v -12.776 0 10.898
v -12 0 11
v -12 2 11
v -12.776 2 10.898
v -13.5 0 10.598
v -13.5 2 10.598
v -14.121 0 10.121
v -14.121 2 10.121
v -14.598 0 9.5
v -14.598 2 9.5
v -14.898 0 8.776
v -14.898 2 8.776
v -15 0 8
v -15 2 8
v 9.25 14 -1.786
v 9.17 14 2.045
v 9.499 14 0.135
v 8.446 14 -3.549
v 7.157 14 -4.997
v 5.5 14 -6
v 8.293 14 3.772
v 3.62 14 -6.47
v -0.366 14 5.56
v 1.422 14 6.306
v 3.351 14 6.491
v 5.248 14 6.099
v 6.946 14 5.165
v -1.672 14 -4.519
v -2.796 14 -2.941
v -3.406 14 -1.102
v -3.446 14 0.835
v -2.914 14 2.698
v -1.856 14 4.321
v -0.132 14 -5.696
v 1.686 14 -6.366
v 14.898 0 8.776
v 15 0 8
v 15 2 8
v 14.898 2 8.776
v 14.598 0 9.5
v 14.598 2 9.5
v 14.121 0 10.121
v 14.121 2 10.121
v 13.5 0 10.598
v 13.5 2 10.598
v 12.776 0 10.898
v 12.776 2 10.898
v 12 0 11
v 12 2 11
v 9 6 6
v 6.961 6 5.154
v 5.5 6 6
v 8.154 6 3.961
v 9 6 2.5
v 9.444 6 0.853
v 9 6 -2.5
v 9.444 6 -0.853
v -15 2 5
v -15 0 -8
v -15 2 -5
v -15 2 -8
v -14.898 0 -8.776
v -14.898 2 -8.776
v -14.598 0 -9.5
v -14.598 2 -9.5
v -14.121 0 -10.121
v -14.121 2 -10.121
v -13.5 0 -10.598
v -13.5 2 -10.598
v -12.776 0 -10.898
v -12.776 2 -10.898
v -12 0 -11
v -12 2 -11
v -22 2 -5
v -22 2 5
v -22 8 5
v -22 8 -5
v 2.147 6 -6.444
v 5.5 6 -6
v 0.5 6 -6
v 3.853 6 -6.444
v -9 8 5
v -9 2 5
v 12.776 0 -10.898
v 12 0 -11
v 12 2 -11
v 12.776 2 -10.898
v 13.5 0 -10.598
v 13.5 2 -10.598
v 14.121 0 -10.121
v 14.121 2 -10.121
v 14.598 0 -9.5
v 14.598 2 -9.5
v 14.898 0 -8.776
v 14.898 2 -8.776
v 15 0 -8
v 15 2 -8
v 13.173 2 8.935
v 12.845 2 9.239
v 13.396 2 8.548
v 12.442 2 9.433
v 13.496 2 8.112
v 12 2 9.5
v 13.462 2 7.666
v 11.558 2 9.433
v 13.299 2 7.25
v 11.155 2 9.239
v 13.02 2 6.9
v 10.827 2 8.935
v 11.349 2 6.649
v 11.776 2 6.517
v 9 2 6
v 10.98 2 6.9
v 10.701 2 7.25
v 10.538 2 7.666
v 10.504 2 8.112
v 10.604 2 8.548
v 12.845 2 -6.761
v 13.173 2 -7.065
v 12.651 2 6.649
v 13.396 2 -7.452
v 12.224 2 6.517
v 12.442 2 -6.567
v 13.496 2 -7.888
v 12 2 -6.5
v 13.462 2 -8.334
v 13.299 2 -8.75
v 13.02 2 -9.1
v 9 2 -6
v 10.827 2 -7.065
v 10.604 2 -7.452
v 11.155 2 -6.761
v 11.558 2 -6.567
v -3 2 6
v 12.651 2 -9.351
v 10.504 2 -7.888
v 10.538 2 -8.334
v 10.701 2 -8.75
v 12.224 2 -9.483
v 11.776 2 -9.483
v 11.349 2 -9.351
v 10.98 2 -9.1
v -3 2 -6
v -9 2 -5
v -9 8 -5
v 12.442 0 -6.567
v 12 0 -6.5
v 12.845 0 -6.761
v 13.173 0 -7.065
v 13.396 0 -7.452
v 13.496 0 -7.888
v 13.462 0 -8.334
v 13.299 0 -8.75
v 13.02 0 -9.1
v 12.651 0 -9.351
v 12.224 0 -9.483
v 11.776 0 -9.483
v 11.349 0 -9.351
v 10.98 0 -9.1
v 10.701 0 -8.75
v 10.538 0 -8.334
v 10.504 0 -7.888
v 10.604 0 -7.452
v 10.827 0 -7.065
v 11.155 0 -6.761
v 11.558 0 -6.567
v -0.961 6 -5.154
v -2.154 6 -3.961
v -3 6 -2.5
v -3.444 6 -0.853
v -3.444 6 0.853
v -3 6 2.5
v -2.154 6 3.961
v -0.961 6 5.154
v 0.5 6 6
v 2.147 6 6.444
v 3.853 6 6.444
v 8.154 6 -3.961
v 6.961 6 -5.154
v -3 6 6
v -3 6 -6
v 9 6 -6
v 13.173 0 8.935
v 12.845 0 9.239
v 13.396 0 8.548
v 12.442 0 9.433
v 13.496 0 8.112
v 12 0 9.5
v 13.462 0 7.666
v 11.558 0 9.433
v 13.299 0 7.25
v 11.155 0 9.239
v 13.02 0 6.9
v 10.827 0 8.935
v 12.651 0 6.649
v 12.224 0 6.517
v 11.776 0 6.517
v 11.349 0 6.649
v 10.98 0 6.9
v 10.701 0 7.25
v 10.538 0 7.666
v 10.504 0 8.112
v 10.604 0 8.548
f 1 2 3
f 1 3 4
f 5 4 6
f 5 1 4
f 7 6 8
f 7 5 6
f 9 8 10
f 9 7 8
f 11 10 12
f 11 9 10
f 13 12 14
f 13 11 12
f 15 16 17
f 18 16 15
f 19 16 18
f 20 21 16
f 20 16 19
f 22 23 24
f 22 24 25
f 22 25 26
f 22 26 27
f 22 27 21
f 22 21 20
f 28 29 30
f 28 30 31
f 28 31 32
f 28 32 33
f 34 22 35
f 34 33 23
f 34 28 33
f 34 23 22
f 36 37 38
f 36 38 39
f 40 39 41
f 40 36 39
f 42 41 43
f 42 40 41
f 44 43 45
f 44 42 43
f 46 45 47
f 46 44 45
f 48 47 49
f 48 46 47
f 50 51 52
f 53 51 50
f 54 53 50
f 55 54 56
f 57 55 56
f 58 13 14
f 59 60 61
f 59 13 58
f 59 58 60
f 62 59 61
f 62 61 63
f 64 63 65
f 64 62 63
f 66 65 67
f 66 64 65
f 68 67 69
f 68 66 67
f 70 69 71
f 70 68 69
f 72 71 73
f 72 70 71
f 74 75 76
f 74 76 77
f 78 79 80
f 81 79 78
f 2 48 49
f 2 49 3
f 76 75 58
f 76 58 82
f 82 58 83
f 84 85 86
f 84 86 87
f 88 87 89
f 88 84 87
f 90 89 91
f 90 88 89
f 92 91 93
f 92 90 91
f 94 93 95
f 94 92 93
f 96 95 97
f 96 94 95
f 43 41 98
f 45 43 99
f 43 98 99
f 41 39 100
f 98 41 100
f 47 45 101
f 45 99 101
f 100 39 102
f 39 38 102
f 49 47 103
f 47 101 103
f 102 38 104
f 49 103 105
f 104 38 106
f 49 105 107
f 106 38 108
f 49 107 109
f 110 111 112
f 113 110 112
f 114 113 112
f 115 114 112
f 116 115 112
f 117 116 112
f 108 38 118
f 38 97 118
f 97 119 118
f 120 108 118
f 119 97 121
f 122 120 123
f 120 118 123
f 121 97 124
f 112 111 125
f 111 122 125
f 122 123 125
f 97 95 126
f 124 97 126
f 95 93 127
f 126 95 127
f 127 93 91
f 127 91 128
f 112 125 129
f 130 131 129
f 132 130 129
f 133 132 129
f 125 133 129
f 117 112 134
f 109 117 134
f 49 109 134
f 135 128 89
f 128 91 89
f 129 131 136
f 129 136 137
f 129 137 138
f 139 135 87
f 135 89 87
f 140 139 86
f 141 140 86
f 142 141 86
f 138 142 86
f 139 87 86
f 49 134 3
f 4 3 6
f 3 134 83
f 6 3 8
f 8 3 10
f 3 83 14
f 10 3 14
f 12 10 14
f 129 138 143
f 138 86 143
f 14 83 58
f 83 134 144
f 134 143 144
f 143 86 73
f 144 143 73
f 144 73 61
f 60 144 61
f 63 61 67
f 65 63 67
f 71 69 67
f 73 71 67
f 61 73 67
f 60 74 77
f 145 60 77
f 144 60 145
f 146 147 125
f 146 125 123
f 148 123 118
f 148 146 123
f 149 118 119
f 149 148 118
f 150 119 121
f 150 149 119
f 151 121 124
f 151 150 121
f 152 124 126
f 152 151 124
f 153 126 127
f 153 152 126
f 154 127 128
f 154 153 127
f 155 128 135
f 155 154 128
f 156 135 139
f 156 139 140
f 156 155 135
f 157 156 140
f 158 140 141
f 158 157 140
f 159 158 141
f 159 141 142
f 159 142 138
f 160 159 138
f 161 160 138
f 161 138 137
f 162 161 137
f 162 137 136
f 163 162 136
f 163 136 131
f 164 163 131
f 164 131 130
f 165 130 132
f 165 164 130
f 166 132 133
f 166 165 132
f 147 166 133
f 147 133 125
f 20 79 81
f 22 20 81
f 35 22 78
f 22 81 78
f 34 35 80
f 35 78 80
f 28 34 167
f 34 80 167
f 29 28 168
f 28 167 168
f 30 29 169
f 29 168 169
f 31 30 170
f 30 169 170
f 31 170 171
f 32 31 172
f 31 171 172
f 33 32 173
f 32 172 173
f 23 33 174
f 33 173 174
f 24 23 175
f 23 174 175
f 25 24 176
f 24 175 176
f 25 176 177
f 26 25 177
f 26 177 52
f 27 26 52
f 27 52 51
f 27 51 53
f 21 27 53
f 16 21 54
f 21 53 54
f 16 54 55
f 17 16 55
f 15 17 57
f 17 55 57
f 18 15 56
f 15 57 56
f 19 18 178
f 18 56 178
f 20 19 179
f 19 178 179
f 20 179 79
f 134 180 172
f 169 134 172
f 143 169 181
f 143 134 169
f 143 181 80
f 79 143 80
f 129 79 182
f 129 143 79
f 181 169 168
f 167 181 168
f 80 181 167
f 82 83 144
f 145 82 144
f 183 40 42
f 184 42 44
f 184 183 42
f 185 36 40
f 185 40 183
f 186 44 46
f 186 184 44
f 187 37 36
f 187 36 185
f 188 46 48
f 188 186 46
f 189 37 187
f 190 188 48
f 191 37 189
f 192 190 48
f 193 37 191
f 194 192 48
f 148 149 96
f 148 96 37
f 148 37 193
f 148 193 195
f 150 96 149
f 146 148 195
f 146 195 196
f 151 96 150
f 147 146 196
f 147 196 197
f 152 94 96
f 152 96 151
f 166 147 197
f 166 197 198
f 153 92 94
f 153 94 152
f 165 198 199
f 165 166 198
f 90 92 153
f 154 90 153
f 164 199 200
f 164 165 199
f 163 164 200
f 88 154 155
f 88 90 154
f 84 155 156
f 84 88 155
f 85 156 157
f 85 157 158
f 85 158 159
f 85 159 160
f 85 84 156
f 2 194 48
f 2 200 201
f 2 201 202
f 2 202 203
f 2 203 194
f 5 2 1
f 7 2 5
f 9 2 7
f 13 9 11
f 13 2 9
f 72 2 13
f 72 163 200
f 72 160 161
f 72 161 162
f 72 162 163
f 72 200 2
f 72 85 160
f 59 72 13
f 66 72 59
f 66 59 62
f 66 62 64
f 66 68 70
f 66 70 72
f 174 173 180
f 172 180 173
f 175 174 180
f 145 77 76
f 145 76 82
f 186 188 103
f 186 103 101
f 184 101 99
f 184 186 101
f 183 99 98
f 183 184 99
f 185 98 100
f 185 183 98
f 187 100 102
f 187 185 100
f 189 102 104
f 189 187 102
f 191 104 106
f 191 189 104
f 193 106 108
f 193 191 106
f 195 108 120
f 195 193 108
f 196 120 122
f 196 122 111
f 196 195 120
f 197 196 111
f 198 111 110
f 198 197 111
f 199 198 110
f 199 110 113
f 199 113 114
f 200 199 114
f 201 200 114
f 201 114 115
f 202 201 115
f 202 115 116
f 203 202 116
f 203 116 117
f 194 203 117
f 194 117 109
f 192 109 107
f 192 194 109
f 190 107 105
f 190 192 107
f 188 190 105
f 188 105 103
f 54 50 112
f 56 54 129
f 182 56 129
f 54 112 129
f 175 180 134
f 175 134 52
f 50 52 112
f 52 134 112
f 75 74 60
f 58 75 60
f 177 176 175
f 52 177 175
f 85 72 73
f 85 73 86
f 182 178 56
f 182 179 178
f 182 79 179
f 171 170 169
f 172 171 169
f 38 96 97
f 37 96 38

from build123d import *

# Parameters (mm, degrees)
SKETCH1_R           = 1.5
BOSS_EXTRUDE1_DEPTH = 2
SKETCH2_W           = 13
SKETCH2_H           = 10
BOSS_EXTRUDE2_DEPTH = 6
SKETCH4_W           = 12
SKETCH4_H           = 12
BOSS_EXTRUDE4_DEPTH = 4
SKETCH5_R           = 6.5
BOSS_EXTRUDE5_DEPTH = 8


with BuildPart() as part:
    # Sketch1 → Boss-Extrude1 (new body)
    with BuildSketch(Plane(origin=(0, 0, 0), x_dir=(1, 0, 0), z_dir=(0, 1, 0))):
        with BuildLine():
            Line((-12, 11), (12, 11))
            ThreePointArc((12, 11), (14.121320344, 10.121320344), (15, 8))
            Line((15, 8), (15, -8))
            ThreePointArc((15, -8), (14.121320344, -10.121320344), (12, -11))
            Line((12, -11), (-12, -11))
            ThreePointArc((-12, -11), (-14.121320344, -10.121320344), (-15, -8))
            Line((-15, -8), (-15, 8))
            ThreePointArc((-15, 8), (-14.121320344, 10.121320344), (-12, 11))
        make_face()
        with Locations(Location((12, 8, 0), (0, 0, 270))):
            Circle(SKETCH1_R, mode=Mode.SUBTRACT)
        with Locations(Location((12, -8, 0), (0, 0, 270))):
            Circle(SKETCH1_R, mode=Mode.SUBTRACT)
    extrude(amount=BOSS_EXTRUDE1_DEPTH)

    # Sketch2 → Boss-Extrude2 (add)
    with BuildSketch(Plane(origin=(0, 2, 0), x_dir=(1, 0, 0), z_dir=(0, 1, 0))):
        with Locations((-15.5, 0)):
            Rectangle(SKETCH2_W, SKETCH2_H)
    extrude(amount=BOSS_EXTRUDE2_DEPTH)

    # Sketch4 → Boss-Extrude4 (add)
    with BuildSketch(Plane(origin=(0, 2, 0), x_dir=(1, 0, 0), z_dir=(0, 1, 0))):
        with Locations((3, 0)):
            Rectangle(SKETCH4_W, SKETCH4_H)
    extrude(amount=BOSS_EXTRUDE4_DEPTH)

    # Sketch5 → Boss-Extrude5 (add)
    with BuildSketch(Plane(origin=(0, 6, 0), x_dir=(1, 0, 0), z_dir=(0, 1, 0))):
        with Locations(Location((3, 0, 0), (0, 0, 67.380135052))):
            Circle(SKETCH5_R)
    extrude(amount=BOSS_EXTRUDE5_DEPTH)


solid = part.part
